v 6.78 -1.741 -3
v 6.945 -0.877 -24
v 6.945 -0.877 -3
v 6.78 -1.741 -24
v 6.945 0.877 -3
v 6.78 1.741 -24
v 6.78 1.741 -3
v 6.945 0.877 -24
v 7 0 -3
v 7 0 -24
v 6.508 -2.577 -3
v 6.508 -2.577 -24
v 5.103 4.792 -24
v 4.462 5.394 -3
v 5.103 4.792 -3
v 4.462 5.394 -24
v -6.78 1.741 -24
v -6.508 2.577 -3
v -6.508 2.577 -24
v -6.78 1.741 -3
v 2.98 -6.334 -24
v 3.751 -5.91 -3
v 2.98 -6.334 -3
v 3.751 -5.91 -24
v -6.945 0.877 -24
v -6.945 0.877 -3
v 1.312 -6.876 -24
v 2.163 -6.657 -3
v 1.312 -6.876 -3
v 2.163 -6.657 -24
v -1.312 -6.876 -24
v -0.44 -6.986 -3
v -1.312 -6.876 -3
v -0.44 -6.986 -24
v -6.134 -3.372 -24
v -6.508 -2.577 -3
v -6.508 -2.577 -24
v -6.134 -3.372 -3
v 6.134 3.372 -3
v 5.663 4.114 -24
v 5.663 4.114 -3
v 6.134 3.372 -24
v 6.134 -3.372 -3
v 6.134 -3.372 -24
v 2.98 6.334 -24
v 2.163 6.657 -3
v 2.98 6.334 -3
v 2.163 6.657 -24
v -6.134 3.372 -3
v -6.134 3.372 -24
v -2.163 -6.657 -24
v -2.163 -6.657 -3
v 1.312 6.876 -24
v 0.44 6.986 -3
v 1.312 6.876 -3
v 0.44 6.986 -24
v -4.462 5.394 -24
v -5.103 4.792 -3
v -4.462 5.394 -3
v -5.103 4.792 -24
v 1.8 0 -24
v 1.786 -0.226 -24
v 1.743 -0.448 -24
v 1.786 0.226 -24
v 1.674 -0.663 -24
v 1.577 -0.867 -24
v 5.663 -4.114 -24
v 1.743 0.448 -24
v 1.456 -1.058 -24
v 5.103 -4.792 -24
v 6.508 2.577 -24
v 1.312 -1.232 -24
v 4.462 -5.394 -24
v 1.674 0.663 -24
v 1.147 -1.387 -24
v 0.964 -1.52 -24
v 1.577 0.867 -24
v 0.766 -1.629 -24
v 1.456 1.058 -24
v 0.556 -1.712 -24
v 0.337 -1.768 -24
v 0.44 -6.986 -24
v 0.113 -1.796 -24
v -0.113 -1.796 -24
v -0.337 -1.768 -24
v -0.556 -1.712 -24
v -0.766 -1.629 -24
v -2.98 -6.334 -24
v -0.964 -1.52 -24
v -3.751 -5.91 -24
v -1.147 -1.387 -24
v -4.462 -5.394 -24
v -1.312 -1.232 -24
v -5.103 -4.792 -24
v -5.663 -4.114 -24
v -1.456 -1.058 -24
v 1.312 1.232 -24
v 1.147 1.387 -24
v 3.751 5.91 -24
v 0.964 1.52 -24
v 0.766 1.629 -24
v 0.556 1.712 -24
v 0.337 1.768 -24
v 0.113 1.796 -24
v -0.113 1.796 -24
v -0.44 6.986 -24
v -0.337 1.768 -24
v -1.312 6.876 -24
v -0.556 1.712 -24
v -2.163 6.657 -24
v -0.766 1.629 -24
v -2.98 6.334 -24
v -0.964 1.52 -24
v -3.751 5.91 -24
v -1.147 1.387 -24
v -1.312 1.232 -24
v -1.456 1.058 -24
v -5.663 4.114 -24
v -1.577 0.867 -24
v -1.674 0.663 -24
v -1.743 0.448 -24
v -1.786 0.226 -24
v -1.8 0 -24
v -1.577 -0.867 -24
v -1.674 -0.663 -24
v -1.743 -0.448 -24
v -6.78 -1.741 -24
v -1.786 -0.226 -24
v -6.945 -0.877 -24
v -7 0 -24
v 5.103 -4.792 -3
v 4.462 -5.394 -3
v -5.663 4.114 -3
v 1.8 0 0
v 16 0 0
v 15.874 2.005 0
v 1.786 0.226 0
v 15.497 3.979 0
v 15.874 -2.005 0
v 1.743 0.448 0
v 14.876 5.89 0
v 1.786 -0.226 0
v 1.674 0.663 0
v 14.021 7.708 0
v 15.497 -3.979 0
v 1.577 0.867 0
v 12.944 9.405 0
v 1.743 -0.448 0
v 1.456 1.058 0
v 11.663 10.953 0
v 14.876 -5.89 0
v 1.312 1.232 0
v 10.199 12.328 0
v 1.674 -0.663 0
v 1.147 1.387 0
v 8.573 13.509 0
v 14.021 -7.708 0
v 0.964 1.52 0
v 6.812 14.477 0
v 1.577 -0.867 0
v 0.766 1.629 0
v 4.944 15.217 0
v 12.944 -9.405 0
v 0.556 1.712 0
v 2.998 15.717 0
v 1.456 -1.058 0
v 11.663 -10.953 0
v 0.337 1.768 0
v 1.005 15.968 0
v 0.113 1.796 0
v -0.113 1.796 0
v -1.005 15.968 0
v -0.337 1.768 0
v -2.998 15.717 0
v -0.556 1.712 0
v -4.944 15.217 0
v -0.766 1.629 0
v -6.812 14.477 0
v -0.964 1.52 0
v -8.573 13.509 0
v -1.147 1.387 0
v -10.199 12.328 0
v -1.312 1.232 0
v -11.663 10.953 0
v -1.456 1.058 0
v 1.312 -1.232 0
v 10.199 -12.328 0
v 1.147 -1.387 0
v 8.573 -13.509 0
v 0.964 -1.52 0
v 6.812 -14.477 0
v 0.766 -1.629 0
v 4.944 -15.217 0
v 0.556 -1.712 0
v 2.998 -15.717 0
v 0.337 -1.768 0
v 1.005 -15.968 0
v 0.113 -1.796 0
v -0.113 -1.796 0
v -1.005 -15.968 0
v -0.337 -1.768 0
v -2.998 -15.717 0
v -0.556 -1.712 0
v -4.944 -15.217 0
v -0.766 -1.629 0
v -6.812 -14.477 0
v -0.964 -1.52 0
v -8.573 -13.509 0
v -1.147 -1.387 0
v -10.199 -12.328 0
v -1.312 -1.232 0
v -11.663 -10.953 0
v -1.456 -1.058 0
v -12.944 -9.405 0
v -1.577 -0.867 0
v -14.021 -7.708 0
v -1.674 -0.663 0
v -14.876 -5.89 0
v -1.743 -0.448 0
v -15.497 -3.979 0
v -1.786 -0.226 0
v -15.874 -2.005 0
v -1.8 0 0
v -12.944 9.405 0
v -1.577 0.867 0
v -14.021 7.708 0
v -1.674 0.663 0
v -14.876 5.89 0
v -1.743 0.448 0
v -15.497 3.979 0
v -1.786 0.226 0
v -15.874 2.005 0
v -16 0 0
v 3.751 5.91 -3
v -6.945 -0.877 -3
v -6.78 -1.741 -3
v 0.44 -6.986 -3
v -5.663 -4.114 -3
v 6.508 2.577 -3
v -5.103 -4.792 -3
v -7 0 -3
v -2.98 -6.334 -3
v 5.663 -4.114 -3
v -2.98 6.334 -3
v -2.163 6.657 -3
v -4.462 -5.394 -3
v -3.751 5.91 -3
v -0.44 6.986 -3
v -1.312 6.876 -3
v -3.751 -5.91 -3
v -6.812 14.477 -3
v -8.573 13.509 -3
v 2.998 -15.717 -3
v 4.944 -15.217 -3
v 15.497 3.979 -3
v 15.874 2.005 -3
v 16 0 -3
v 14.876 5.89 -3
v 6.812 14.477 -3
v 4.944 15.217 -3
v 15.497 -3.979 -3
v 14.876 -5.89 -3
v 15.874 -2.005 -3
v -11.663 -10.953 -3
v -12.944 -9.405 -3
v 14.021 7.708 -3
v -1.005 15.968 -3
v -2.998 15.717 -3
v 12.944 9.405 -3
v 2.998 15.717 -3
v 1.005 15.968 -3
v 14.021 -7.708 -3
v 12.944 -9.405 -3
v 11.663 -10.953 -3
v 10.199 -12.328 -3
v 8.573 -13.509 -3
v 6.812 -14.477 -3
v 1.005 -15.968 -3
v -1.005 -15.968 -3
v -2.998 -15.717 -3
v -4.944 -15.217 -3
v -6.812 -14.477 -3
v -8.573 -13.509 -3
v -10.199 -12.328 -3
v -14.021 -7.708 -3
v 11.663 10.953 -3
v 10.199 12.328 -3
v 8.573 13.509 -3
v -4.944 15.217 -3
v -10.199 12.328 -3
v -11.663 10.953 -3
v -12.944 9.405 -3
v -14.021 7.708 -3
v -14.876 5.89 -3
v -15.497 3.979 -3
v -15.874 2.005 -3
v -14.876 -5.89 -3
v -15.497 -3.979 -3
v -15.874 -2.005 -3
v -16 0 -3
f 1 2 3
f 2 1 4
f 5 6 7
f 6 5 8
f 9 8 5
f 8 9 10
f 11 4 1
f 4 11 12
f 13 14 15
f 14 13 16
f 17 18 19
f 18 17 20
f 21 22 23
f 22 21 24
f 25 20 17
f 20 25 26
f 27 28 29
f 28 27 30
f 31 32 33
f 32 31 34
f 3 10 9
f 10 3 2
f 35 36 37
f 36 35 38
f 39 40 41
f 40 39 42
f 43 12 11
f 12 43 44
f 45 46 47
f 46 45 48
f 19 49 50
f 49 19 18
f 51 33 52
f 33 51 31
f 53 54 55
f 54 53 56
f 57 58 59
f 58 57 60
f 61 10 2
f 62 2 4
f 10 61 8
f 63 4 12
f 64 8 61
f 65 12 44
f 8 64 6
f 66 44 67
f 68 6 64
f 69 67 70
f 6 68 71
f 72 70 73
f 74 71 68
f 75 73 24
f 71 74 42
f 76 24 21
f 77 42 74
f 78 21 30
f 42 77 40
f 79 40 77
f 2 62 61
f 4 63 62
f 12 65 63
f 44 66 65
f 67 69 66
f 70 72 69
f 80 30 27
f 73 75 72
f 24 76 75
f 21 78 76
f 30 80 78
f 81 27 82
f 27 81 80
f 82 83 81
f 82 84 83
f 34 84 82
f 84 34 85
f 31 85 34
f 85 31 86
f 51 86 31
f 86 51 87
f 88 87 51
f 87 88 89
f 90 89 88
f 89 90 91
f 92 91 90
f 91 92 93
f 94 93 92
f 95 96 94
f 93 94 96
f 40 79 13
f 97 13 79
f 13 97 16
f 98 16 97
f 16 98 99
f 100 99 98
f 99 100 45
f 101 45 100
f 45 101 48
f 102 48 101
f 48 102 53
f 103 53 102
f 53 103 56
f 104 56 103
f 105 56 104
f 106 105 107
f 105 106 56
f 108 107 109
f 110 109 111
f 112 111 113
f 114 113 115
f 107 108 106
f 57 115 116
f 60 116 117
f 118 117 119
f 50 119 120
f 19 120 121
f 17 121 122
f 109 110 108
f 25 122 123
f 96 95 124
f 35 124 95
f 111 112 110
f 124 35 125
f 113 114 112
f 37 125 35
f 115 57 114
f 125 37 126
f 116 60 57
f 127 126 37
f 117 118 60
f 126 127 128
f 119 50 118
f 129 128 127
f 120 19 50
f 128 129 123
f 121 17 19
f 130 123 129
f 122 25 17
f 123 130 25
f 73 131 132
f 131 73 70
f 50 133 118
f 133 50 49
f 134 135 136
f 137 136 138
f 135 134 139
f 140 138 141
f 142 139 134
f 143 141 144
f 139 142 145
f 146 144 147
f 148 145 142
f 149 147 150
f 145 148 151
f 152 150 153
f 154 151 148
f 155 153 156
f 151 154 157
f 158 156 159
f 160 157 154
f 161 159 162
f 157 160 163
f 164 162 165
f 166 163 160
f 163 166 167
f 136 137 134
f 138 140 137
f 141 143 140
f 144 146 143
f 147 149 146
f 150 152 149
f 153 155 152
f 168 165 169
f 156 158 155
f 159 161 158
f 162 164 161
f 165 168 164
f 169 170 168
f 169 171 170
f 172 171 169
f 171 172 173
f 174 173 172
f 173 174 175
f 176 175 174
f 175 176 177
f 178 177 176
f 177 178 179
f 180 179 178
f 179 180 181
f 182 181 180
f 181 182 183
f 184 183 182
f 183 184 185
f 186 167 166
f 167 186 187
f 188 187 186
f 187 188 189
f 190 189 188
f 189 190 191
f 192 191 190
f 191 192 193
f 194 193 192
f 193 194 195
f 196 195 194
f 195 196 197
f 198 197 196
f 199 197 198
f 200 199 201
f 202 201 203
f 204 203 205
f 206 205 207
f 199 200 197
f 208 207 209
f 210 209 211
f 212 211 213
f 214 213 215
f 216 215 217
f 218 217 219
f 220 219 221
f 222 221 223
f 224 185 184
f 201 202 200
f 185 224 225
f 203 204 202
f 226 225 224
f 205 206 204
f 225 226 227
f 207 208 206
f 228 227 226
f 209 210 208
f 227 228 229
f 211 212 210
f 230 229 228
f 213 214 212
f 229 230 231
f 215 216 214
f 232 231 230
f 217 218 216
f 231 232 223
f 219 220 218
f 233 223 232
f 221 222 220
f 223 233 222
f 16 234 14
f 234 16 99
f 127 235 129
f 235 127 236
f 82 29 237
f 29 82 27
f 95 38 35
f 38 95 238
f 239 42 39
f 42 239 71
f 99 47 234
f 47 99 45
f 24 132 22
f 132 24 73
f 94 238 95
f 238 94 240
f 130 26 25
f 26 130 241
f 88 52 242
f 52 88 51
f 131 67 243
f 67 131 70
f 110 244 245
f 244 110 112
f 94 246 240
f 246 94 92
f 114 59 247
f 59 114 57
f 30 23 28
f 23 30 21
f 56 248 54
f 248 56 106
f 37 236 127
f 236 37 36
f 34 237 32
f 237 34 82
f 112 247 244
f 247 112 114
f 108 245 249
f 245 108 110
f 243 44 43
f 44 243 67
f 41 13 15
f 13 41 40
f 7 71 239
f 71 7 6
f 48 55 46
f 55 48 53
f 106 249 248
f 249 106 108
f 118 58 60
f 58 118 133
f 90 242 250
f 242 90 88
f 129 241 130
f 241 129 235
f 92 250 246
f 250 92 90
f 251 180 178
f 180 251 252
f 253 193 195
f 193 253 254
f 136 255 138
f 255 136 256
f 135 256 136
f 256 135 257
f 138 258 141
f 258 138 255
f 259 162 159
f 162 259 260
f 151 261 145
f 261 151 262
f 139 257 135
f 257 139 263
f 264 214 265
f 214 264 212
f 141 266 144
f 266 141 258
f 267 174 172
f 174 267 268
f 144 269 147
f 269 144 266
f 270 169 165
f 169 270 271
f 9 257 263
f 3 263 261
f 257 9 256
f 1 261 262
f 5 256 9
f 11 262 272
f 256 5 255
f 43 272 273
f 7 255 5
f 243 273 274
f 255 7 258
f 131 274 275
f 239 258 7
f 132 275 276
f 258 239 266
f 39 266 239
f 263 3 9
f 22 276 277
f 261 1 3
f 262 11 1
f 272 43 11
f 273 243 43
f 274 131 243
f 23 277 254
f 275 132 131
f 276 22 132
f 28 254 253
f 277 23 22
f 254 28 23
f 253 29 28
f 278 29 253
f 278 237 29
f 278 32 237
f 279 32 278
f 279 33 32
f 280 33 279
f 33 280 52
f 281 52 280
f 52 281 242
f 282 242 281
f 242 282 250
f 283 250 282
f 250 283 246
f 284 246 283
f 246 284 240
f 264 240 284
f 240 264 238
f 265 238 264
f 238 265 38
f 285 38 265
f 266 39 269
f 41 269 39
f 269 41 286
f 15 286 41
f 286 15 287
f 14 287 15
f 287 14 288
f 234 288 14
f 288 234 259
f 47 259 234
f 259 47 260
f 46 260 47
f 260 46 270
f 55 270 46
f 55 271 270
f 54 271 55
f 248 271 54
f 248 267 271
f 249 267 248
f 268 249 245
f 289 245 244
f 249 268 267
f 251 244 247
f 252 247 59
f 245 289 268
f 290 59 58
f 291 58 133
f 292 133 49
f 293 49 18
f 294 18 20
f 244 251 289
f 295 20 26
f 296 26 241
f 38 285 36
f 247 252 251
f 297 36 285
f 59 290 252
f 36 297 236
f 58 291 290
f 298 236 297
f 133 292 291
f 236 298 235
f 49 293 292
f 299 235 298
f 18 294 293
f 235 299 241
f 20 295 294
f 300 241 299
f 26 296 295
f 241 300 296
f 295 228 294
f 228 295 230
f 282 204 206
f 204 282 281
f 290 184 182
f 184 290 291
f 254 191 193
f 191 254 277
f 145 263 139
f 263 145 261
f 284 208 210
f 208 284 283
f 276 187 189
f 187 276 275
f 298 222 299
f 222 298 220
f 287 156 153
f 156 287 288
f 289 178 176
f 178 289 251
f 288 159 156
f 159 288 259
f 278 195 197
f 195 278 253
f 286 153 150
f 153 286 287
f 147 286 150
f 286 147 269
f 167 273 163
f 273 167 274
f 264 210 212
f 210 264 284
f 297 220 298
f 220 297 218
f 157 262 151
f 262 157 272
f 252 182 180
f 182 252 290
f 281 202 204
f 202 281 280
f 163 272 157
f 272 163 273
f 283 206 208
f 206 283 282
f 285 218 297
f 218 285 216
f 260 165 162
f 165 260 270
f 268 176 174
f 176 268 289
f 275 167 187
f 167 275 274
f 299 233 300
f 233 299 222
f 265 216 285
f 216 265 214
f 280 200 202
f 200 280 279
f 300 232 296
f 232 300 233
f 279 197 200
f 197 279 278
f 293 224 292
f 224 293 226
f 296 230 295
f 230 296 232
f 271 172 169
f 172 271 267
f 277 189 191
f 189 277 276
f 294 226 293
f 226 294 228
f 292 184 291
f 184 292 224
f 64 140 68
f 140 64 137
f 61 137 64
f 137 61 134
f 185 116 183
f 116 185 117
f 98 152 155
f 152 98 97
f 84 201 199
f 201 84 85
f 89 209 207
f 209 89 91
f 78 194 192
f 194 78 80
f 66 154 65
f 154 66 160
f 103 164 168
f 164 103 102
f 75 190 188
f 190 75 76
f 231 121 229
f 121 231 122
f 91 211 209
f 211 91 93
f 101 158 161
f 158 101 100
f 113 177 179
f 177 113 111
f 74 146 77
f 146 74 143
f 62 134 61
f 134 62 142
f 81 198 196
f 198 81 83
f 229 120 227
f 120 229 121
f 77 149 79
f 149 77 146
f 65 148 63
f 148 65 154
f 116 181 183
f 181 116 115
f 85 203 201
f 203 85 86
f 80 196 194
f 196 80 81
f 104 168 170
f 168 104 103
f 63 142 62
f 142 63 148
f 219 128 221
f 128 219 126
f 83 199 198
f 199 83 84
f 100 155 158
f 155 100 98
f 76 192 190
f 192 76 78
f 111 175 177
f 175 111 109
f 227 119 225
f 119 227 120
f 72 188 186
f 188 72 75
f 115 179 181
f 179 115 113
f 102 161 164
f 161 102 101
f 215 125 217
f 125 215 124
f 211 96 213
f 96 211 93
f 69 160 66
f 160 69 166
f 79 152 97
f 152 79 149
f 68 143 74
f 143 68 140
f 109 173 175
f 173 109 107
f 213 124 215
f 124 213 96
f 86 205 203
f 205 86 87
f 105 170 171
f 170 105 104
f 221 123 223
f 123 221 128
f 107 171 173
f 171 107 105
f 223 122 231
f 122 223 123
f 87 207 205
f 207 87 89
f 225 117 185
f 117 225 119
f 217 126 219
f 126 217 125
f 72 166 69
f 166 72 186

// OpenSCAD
$fn = 50;


difference() {
	union() {
		translate(v = [0, 0, -24.0000000000]) {
			cylinder(h = 24, r = 7.0000000000);
		}
		translate(v = [0, 0, -3.0000000000]) {
			cylinder(h = 3, r = 16.0000000000);
		}
	}
	union() {
		#translate(v = [0, 0, -24]) {
			cylinder(h = 24, r = 1.8000000000);
		}
	}
}
